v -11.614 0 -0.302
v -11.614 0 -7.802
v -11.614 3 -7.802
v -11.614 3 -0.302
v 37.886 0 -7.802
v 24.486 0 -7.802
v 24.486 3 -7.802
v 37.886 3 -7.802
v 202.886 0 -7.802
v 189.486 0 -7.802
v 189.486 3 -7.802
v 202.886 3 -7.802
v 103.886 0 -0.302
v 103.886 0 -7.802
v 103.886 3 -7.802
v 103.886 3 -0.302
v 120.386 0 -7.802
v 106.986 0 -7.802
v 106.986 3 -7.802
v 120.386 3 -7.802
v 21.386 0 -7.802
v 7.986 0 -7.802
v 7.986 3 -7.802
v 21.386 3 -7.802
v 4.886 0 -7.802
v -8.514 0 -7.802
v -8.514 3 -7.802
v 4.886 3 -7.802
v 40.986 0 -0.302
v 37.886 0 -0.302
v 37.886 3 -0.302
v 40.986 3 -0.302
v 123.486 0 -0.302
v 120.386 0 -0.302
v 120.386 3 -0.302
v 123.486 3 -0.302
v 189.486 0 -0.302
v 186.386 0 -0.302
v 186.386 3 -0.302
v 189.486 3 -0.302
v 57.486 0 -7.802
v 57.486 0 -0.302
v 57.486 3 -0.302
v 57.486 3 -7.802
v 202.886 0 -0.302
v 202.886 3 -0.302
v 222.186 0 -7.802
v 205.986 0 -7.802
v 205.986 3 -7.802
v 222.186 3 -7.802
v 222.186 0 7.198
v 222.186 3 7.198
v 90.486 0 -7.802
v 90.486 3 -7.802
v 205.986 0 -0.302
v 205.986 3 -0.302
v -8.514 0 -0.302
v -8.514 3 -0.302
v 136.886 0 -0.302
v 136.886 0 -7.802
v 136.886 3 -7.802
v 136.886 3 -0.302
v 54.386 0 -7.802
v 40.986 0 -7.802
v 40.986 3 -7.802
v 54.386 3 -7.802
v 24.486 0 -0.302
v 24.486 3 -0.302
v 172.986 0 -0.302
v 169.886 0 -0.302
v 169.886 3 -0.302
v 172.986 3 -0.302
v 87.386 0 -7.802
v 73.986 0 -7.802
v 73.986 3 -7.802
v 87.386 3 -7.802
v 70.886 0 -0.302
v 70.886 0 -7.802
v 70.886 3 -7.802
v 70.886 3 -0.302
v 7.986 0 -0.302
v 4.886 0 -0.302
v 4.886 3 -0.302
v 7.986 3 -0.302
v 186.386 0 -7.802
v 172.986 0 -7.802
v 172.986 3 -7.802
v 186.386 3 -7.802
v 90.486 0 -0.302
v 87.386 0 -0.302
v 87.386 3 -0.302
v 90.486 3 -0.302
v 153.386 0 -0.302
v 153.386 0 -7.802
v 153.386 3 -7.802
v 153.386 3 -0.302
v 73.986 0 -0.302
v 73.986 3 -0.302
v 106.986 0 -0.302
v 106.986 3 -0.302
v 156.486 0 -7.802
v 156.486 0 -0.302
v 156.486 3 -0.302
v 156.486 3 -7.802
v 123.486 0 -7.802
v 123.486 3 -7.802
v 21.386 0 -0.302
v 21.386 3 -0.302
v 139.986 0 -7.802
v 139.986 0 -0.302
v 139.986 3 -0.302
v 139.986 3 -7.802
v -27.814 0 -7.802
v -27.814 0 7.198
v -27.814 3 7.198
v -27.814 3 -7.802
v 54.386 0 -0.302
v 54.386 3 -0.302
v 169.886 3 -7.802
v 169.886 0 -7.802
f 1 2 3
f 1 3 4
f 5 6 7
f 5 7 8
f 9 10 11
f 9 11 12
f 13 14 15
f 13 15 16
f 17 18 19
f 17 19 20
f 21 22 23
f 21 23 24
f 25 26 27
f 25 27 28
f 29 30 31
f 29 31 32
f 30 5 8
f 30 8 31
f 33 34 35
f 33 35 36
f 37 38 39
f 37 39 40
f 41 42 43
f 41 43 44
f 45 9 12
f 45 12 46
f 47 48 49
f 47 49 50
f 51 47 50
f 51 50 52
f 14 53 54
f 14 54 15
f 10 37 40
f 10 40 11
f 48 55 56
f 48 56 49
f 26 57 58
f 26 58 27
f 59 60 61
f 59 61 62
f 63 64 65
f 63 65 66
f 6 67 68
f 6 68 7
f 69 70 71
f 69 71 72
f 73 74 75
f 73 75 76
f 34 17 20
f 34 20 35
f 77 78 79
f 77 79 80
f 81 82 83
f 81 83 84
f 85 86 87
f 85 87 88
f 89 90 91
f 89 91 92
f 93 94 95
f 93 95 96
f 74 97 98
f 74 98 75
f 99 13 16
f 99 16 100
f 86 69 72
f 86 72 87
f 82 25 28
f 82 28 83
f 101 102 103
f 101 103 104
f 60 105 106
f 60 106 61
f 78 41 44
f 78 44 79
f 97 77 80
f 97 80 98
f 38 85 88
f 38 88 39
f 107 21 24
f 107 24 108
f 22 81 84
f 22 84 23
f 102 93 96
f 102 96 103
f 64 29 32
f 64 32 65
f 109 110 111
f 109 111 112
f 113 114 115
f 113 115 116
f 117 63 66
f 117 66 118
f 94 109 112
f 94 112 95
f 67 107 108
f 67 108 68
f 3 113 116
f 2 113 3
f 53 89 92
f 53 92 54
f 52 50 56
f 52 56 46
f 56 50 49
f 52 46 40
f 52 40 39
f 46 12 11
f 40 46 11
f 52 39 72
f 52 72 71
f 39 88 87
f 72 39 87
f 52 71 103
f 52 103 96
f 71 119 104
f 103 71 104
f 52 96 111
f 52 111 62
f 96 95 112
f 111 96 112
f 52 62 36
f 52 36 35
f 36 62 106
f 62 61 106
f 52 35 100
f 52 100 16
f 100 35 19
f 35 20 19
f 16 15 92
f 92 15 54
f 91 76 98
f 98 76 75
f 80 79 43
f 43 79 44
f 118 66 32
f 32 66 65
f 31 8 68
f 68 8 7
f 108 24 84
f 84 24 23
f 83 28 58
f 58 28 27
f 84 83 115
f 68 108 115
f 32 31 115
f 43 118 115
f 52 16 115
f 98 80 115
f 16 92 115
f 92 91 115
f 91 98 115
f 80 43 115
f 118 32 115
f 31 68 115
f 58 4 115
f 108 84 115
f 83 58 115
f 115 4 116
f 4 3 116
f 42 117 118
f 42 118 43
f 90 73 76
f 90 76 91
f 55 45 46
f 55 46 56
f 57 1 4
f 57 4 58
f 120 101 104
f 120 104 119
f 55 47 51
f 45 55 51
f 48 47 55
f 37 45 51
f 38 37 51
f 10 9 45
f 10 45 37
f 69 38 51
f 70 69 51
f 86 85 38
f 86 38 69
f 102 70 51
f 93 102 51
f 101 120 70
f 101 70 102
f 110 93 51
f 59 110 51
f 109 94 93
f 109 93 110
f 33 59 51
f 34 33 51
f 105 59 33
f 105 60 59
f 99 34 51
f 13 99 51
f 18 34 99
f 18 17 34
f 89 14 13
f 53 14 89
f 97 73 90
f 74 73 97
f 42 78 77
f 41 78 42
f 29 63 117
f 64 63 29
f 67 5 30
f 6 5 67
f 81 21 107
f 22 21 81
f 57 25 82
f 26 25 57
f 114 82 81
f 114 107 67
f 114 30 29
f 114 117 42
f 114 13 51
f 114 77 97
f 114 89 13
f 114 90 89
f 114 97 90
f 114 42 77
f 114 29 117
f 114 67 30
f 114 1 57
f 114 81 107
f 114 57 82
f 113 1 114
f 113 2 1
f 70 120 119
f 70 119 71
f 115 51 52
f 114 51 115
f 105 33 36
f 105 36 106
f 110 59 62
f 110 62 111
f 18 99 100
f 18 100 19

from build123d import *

# Parameters (mm, degrees)
AUFSATZ_LINEAR_AUSTRAGEN1_DEPTH = 3


with BuildPart() as part:
    # Skizze1 → Aufsatz-Linear austragen1 (new body)
    with BuildSketch(Plane(origin=(0, 0, 0), x_dir=(1, 0, 0), z_dir=(0, 1, 0))):
        Polygon((4.885929648, 7.801507538), (4.885929648, 0.301507538), (7.985929648, 0.301507538), (7.985929648, 7.801507538), (21.385929648, 7.801507538), (21.385929648, 0.301507538), (24.485929648, 0.301507538), (24.485929648, 7.801507538), (37.885929648, 7.801507538), (37.885929648, 0.301507538), (40.985929648, 0.301507538), (40.985929648, 7.801507538), (54.385929648, 7.801507538), (54.385929648, 0.301507538), (57.485929648, 0.301507538), (57.485929648, 7.801507538), (70.885929648, 7.801507538), (70.885929648, 0.301507538), (73.985929648, 0.301507538), (73.985929648, 7.801507538), (87.385929648, 7.801507538), (87.385929648, 0.301507538), (90.485929648, 0.301507538), (90.485929648, 7.801507538), (103.885929648, 7.801507538), (103.885929648, 0.301507538), (106.985929648, 0.301507538), (106.985929648, 7.801507538), (120.385929648, 7.801507538), (120.385929648, 0.301507538), (123.485929648, 0.301507538), (123.485929648, 7.801507538), (136.885929648, 7.801507538), (136.885929648, 0.301507538), (139.985929648, 0.301507538), (139.985929648, 7.801507538), (153.385929648, 7.801507538), (153.385929648, 0.301507538), (156.485929648, 0.301507538), (156.485929648, 7.801507538), (169.885929648, 7.801507538), (169.885929648, 0.301507538), (172.985929648, 0.301507538), (172.985929648, 7.801507538), (186.385929648, 7.801507538), (186.385929648, 0.301507538), (189.485929648, 0.301507538), (189.485929648, 7.801507538), (202.885929648, 7.801507538), (202.885929648, 0.301507538), (205.985929648, 0.301507538), (205.985929648, 7.801507538), (222.185929648, 7.801507538), (222.185929648, -7.198492462), (-27.814070352, -7.198492462), (-27.814070352, 7.801507538), (-11.614070352, 7.801507538), (-11.614070352, 0.301507538), (-8.514070352, 0.301507538), (-8.514070352, 7.801507538), align=None)
    extrude(amount=AUFSATZ_LINEAR_AUSTRAGEN1_DEPTH)


solid = part.part
